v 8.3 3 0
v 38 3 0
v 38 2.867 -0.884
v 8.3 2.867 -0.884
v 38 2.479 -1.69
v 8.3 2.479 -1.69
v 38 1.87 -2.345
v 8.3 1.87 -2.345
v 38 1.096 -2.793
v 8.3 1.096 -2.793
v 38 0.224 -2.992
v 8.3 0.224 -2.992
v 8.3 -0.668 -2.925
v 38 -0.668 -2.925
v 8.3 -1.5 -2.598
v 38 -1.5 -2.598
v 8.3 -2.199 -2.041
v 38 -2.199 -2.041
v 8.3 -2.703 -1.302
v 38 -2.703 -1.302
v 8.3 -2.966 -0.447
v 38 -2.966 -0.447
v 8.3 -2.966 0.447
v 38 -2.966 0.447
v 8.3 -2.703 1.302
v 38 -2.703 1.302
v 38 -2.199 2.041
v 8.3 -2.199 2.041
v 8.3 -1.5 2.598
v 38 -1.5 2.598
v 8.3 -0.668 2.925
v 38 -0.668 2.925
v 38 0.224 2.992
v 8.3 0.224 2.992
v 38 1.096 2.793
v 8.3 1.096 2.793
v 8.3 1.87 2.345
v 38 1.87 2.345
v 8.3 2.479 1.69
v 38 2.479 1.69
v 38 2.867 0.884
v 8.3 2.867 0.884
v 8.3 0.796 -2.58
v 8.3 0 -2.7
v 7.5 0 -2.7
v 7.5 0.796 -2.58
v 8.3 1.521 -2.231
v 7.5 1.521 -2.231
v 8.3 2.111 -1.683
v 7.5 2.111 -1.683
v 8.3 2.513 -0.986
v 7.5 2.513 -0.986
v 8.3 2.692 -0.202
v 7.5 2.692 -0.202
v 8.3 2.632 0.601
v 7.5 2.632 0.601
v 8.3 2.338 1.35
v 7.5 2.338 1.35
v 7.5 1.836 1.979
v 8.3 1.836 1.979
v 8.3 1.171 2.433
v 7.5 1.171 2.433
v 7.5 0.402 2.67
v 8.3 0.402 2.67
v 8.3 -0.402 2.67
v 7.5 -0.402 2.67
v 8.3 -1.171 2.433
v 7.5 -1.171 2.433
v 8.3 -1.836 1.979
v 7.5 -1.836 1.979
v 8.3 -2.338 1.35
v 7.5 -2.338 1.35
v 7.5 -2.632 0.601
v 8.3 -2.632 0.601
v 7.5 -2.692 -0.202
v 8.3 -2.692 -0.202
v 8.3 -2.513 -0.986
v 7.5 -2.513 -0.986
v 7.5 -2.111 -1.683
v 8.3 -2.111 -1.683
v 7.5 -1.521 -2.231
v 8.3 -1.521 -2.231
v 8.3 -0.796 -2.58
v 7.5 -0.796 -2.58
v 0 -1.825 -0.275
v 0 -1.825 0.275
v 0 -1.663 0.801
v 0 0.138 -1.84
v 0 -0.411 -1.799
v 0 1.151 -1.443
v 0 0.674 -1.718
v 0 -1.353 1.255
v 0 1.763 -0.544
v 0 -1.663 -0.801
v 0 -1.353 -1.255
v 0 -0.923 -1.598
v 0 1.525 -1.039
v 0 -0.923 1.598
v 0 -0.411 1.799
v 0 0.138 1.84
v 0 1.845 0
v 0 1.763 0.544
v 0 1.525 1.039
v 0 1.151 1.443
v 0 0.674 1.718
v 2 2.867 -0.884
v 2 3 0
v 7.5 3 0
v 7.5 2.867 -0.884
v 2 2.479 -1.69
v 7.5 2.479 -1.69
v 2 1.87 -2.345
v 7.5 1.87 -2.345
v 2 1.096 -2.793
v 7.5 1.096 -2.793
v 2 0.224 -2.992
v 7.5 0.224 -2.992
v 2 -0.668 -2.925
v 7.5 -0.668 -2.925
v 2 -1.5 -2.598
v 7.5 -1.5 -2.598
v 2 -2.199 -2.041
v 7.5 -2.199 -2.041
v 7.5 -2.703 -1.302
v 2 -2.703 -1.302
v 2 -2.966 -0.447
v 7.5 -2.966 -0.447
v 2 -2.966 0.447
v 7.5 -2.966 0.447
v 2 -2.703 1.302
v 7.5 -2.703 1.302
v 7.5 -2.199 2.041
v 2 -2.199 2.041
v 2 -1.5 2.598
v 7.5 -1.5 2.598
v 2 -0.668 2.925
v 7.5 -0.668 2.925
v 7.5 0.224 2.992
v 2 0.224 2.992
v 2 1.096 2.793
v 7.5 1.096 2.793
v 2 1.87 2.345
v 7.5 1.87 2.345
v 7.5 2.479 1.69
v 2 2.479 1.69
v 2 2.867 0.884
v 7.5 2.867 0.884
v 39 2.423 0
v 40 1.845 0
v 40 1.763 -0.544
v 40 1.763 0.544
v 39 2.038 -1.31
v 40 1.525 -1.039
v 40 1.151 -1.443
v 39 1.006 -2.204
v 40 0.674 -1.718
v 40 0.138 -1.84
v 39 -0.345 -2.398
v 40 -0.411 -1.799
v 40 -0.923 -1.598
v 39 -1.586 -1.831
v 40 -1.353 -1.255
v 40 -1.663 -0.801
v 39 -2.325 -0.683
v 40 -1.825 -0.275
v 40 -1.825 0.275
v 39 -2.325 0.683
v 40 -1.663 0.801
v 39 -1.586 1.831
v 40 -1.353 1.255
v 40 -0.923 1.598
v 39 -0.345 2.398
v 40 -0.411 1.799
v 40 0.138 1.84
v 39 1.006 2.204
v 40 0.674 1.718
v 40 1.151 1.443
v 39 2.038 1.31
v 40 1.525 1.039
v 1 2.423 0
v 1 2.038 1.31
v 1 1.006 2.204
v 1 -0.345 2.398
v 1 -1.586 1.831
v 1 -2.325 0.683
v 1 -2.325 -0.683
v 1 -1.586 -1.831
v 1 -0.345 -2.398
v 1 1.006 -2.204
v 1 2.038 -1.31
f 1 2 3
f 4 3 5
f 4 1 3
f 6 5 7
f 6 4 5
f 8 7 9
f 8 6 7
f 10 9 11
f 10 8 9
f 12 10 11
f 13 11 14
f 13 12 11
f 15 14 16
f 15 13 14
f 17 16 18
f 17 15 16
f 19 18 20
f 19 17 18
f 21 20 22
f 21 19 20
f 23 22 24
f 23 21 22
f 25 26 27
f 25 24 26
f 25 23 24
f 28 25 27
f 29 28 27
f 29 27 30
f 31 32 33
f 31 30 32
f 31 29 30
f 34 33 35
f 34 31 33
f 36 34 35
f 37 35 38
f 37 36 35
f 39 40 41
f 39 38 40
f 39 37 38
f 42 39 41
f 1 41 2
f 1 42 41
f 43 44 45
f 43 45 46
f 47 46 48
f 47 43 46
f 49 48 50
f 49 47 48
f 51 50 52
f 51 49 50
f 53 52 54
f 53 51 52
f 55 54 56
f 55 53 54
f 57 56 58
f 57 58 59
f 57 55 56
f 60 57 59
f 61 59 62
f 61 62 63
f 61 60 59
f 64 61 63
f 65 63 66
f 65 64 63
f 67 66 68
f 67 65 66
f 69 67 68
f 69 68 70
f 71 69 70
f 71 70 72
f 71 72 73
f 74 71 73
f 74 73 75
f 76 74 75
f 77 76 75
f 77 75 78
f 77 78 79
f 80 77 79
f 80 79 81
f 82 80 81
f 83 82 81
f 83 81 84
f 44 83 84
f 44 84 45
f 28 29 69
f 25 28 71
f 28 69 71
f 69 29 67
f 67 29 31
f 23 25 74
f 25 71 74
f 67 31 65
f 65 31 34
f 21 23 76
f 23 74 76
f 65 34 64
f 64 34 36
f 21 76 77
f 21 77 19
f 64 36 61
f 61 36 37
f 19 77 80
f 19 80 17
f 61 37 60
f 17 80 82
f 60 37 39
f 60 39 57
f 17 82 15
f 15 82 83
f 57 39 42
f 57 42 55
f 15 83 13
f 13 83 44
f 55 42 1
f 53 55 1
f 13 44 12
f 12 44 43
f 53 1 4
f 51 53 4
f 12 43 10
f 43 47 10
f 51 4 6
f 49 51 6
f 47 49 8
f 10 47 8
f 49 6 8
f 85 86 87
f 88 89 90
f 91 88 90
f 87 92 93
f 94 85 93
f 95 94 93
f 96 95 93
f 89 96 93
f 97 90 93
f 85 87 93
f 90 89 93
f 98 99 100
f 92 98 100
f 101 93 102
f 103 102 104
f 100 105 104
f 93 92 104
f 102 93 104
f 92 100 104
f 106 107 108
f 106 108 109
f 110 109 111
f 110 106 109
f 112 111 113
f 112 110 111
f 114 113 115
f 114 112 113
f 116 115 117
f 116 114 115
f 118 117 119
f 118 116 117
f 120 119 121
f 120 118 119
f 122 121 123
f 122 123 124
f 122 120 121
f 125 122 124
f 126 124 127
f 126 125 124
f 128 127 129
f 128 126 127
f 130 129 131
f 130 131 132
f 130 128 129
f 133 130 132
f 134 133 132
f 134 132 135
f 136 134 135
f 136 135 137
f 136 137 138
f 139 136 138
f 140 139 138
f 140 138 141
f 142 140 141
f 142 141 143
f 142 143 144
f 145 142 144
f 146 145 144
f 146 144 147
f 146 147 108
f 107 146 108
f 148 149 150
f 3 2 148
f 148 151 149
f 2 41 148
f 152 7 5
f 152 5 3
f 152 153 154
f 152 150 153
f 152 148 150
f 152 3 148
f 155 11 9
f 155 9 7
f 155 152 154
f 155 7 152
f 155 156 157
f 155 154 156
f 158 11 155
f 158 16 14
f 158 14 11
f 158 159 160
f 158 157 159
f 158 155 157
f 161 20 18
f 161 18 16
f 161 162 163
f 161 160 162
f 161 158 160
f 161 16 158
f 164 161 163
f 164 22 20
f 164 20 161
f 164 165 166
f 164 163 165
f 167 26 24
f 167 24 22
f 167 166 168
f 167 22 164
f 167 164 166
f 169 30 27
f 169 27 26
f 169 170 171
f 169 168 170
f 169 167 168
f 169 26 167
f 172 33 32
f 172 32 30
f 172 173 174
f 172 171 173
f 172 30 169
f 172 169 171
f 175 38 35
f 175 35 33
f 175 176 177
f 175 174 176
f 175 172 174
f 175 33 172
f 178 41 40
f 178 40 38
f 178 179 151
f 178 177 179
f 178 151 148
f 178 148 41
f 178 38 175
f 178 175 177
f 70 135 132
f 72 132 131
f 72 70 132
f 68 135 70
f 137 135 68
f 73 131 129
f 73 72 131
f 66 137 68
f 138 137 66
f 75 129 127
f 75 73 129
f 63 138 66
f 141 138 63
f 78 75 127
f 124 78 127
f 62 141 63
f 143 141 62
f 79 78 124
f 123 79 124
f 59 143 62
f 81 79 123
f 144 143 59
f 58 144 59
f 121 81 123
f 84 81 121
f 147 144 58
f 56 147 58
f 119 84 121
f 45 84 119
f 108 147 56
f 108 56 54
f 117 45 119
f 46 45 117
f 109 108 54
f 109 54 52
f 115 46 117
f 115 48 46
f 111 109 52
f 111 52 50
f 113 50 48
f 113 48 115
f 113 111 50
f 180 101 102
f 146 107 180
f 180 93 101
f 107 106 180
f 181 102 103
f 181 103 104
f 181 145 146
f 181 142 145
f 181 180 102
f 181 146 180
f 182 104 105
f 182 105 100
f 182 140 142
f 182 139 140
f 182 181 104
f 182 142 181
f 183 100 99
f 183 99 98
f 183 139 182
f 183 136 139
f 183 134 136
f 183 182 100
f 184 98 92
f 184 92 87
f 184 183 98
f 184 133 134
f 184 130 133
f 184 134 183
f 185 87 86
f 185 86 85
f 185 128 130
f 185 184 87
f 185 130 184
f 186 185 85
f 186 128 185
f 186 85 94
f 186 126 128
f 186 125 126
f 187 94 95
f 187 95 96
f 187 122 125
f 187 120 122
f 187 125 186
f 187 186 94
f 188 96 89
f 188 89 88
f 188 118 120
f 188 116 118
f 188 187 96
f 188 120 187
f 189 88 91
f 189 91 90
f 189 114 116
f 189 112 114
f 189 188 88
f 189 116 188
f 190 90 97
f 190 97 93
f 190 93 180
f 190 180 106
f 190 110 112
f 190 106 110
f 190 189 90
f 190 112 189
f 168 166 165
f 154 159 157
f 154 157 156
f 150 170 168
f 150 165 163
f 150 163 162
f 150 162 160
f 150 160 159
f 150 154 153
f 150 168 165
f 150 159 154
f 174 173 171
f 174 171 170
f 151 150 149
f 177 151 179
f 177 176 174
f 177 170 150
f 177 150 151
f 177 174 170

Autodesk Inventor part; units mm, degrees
ref_plane "YZ Plane" through (0, 0, 0) normal (1, 0, 0) x (0, 1, 0)
ref_plane "XZ Plane" through (0, 0, 0) normal (0, 1, 0) x (-1, 0, 0)
ref_plane "XY Plane" through (0, 0, 0) normal (0, 0, 1) x (1, 0, 0)
sketch "Эскиз" plane through (0, 0, 0) normal (1, 0, 0) x (0, 1, 0)
  circle A0 centre (0, 0) radius 3
  dimension "d1" = 6
extrude "Базовый элемент" add sketch "Эскиз" along normal blind 40
chamfer "Фаска1" distance 2 angle 30 1 edges at (0, -3, 0) measured on face at (26.6667, 2.9612, -0.4812)
chamfer "Эскиз2" distance 2 angle 30 1 edges at (40, -3, 0) measured on face at (27.3333, 2.9903, -0.2414)
sketch "Эскиз3" plane through (0, 0, 0) normal (0, 1, 0) x (-1, 0, 0)
  line L0 (0, 1.8453) -> (0, -1.8453) construction
  line L1 (-40, -1.8453) -> (-40, 1.8453) construction
  line L2 (-2, -3) -> (-38, -3) construction
  line L3 (8, 0) -> (-48, 0) construction
  line L4 (0, -4.2) -> (0, 4.2) construction
  line L5 (-7.5, 9) -> (-32.5, 9) construction
  line L6 (-32.5, 9) -> (-32.5, -9) construction
  line L7 (-32.5, -9) -> (-7.5, -9) construction
  line L8 (-7.5, -9) -> (-7.5, 9) construction
  line L9 (-7.5, -2.7) -> (-8.3, -2.7)
  line L10 (-8.3, -2.7) -> (-8.3, -7)
  line L11 (-8.3, -7) -> (-7.5, -7)
  line L12 (-7.5, -7) -> (-7.5, -2.7)
  point P0 (0, 0)
  dimension "d17" = 25
  dimension "d18" = 7.5
  dimension "d19" = 18
  dimension "d20" = 9
  dimension "d21" = 0.8
  dimension "d22" = 2.7
  dimension "d23" = 7
revolve "Вращение1" cut sketch "Эскиз3" angle 360 about axis through (-10, 0, 0) along (1, 0, 0)
equation "\"d1\" = NND"
equation "\"d2\" = NLG"
equation "\"d8\" = PHH"
equation "\"d9\" = FAWI"
equation "\"d12\" = PHH"
equation "\"d4\" = PHH"
equation "\"d5\" = FAWI"
equation "\"d11\" = PHH"
equation "\"NND\" = 6"
equation "\"NLG\" = 40"
equation "\"PHH\" = 2"
equation "\"FAWI\" = 30deg"
equation "\"DIST1\" = 3.2"
equation "\"DIST2\" = DIST1"
equation "\"BOR1\" = 1.6"
equation "\"FAWI2\" = 30deg"
equation "\"BOR2\" = BOR1"
equation "\"PHH2\" = PHH"
properties part number "ISO 2340 - A - 6 x 40" material "Сталь"
